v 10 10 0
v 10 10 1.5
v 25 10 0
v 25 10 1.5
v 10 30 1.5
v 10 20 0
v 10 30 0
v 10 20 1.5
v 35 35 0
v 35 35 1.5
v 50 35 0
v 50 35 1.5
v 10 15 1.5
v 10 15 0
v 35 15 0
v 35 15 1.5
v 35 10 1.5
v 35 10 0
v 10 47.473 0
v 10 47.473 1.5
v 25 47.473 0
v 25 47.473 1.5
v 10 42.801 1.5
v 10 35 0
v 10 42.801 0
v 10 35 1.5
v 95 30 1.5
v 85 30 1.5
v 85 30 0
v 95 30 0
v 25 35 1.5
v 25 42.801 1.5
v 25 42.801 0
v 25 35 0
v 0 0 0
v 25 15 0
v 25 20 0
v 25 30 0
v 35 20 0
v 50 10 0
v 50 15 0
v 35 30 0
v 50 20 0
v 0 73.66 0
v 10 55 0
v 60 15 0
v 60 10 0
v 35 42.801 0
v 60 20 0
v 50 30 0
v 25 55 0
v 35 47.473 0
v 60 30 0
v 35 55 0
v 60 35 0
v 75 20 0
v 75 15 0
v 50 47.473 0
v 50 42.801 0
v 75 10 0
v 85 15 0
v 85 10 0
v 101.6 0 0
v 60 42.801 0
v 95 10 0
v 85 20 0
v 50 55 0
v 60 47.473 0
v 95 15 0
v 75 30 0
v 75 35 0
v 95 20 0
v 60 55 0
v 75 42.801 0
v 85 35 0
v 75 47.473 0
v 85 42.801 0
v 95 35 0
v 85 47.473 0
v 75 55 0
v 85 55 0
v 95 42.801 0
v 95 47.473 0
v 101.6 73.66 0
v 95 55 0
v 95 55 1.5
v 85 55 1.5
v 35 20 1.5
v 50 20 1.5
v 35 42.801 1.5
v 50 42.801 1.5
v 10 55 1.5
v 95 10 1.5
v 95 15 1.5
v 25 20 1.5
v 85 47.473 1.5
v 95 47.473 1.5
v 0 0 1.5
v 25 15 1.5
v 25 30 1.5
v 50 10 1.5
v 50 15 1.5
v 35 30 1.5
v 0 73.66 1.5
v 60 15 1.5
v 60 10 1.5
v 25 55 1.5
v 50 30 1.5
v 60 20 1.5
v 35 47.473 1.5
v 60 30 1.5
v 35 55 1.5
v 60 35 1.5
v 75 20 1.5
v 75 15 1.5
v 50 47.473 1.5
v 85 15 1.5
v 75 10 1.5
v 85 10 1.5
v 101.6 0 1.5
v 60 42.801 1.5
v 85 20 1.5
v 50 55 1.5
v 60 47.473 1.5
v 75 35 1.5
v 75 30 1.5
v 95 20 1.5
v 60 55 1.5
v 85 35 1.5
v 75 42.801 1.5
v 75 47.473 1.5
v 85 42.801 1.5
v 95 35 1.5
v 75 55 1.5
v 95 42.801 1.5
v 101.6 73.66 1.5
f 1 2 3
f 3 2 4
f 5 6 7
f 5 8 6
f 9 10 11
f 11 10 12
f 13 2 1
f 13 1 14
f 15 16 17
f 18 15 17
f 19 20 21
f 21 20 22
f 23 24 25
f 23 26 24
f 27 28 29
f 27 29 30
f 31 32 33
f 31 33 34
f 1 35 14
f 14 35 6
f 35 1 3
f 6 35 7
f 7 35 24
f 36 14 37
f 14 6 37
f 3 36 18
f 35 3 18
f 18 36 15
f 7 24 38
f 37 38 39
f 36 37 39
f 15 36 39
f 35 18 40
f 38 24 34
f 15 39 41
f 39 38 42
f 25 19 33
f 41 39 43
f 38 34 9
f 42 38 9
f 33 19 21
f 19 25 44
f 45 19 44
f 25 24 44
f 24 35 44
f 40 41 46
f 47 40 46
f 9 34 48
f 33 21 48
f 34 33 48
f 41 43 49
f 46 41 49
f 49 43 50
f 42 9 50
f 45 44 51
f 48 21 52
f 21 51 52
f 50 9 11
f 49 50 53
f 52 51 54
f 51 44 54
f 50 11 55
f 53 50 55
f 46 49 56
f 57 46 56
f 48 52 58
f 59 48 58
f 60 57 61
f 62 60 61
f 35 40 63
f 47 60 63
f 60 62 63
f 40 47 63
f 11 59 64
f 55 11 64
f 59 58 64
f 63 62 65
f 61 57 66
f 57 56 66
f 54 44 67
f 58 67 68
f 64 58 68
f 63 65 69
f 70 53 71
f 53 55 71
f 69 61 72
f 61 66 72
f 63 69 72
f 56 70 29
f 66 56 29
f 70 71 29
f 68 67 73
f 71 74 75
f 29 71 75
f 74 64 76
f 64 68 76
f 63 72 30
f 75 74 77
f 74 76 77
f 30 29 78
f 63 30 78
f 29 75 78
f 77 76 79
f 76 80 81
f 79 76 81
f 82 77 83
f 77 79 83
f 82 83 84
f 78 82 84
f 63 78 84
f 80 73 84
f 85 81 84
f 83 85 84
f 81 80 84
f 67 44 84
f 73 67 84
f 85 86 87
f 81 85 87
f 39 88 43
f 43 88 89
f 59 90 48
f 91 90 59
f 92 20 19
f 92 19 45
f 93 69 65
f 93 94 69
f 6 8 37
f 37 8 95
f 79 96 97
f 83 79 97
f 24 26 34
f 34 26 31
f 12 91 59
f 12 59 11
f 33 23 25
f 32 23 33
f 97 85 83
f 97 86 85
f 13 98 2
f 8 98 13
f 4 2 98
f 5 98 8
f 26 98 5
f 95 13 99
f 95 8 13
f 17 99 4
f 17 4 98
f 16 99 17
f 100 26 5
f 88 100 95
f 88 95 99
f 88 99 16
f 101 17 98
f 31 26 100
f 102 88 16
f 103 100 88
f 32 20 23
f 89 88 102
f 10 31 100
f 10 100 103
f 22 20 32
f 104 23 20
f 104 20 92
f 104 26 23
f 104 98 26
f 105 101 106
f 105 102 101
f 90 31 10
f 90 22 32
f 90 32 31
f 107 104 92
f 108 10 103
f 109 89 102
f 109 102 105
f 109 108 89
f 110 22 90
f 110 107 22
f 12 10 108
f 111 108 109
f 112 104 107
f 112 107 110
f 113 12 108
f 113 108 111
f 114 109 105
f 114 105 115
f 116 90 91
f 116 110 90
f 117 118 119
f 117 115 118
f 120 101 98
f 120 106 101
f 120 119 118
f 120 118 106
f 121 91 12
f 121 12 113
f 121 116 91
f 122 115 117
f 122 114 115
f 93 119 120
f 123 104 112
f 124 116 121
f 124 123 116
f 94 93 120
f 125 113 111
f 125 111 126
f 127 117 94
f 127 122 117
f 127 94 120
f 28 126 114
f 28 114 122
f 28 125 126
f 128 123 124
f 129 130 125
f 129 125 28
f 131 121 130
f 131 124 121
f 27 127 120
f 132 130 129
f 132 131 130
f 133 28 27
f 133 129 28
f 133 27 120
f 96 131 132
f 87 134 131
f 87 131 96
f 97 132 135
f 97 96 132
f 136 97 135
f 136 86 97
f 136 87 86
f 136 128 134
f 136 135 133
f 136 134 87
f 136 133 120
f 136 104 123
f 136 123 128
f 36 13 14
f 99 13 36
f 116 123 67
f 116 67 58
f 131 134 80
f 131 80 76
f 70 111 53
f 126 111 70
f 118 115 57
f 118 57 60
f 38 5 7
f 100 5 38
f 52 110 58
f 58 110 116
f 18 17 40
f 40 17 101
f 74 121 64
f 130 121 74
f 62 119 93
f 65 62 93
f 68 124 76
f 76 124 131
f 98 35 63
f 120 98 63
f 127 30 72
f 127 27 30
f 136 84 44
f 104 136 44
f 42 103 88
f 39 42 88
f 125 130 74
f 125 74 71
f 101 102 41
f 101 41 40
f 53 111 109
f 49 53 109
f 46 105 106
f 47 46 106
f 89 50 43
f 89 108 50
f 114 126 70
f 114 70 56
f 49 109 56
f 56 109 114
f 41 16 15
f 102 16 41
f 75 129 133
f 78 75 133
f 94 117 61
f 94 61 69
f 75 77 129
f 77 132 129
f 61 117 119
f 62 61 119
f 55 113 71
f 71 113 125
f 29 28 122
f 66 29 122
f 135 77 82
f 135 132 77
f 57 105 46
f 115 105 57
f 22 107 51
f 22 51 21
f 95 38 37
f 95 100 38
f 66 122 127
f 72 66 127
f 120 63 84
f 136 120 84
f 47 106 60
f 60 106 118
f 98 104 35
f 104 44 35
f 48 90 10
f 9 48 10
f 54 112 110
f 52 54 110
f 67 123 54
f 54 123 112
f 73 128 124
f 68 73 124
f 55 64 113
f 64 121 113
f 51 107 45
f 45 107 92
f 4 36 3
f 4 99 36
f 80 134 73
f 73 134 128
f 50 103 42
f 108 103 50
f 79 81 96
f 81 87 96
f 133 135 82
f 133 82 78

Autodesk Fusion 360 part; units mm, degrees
sketch "Sketch1" plane through (0, 0, 0) normal (0, 0, 1) x (1, 0, 0)
  line L0 (0, 0) -> (101.6, 0)
  line L1 (101.6, 0) -> (101.6, 73.66)
  line L2 (101.6, 73.66) -> (0, 73.66)
  line L3 (0, 73.66) -> (0, 0)
  dimension "d1" = 101.6
  dimension "d2" = 73.66
extrude "Extrude1" add sketch "Sketch1" along normal blind 1.5
sketch "Sketch2" plane through (0, 0, 1.5) normal (0, 0, 1) x (-1, 0, 0)
  line L0 (0, -73.66) -> (0, 0)
  line L1 (0, 0) -> (-101.6, 0)
  line L2 (-101.6, 0) -> (-101.6, -73.66)
  line L3 (-101.6, -73.66) -> (0, -73.66)
  line L4 (-10, -35) -> (-25, -35)
  line L5 (-10, -30) -> (-25, -30)
  line L6 (-35, -35) -> (-50, -35)
  line L7 (-35, -30) -> (-50, -30)
  line L8 (-60, -35) -> (-75, -35)
  line L9 (-85, -35) -> (-95, -35)
  line L10 (-60, -30) -> (-75, -30)
  line L11 (-85, -30) -> (-95, -30)
  line L12 (-25, -55) -> (-10, -55)
  line L13 (-50, -55) -> (-35, -55)
  line L14 (-95, -55) -> (-85, -55)
  line L15 (-75, -55) -> (-60, -55)
  line L16 (-85, -10) -> (-95, -10)
  line L17 (-60, -10) -> (-75, -10)
  line L18 (-10, -10) -> (-25, -10)
  line L19 (-35, -10) -> (-50, -10)
  line L20 (-10, -20) -> (-95, -20)
  line L21 (-10, -15) -> (-95, -15)
  line L22 (-25, -30) -> (-25, -20)
  line L23 (-25, -15) -> (-25, -10)
  line L24 (-10, -10) -> (-10, -15)
  line L25 (-10, -20) -> (-10, -30)
  line L26 (-35, -30) -> (-35, -20)
  line L27 (-35, -15) -> (-35, -10)
  line L28 (-50, -30) -> (-50, -20)
  line L29 (-50, -15) -> (-50, -10)
  line L30 (-60, -30) -> (-60, -20)
  line L31 (-60, -15) -> (-60, -10)
  line L32 (-75, -30) -> (-75, -20)
  line L33 (-75, -15) -> (-75, -10)
  line L34 (-85, -30) -> (-85, -20)
  line L35 (-85, -15) -> (-85, -10)
  line L36 (-95, -30) -> (-95, -20)
  line L37 (-95, -15) -> (-95, -10)
  line L38 (-10, -35) -> (-10, -42.8011)
  line L39 (-10, -47.4728) -> (-10, -55)
  line L40 (-25, -55) -> (-25, -47.4728)
  line L41 (-25, -42.8011) -> (-25, -35)
  line L42 (-35, -55) -> (-35, -47.4728)
  line L43 (-35, -42.8011) -> (-35, -35)
  line L44 (-10, -42.8011) -> (-25, -42.8011)
  line L45 (-10, -47.4728) -> (-25, -47.4728)
  line L46 (-35, -47.4728) -> (-50, -47.4728)
  line L47 (-35, -42.8011) -> (-50, -42.8011)
  line L48 (-50, -55) -> (-50, -47.4728)
  line L49 (-50, -42.8011) -> (-50, -35)
  line L50 (-60, -55) -> (-60, -47.4728)
  line L51 (-60, -42.8011) -> (-60, -35)
  line L52 (-60, -47.4728) -> (-75, -47.4728)
  line L53 (-85, -47.4728) -> (-95, -47.4728)
  line L54 (-75, -55) -> (-75, -47.4728)
  line L55 (-75, -42.8011) -> (-75, -35)
  line L56 (-60, -42.8011) -> (-75, -42.8011)
  line L57 (-85, -42.8011) -> (-95, -42.8011)
  line L58 (-85, -55) -> (-85, -47.4728)
  line L59 (-85, -42.8011) -> (-85, -35)
  line L60 (-95, -55) -> (-95, -47.4728)
  line L61 (-95, -42.8011) -> (-95, -35)
extrude "Extrude2" cut sketch "Sketch2" against normal blind 5 contours L4 L38 L41 L44 | L11 L20 L34 L36 | L10 L20 L30 L32 | L7 L20 L26 L28 | L5 L20 L22 L25 | L6 L43 L47 L49 | L8 L51 L55 L56 | L9 L57 L59 L61 | L12 L39 L40 L45 | L13 L42 L46 L48 | L14 L53 L58 L60 | L15 L50 L52 L54 | L16 L21 L35 L37 | L18 L21 L23 L24 | L19 L21 L27 L29 | L17 L21 L31 L33
